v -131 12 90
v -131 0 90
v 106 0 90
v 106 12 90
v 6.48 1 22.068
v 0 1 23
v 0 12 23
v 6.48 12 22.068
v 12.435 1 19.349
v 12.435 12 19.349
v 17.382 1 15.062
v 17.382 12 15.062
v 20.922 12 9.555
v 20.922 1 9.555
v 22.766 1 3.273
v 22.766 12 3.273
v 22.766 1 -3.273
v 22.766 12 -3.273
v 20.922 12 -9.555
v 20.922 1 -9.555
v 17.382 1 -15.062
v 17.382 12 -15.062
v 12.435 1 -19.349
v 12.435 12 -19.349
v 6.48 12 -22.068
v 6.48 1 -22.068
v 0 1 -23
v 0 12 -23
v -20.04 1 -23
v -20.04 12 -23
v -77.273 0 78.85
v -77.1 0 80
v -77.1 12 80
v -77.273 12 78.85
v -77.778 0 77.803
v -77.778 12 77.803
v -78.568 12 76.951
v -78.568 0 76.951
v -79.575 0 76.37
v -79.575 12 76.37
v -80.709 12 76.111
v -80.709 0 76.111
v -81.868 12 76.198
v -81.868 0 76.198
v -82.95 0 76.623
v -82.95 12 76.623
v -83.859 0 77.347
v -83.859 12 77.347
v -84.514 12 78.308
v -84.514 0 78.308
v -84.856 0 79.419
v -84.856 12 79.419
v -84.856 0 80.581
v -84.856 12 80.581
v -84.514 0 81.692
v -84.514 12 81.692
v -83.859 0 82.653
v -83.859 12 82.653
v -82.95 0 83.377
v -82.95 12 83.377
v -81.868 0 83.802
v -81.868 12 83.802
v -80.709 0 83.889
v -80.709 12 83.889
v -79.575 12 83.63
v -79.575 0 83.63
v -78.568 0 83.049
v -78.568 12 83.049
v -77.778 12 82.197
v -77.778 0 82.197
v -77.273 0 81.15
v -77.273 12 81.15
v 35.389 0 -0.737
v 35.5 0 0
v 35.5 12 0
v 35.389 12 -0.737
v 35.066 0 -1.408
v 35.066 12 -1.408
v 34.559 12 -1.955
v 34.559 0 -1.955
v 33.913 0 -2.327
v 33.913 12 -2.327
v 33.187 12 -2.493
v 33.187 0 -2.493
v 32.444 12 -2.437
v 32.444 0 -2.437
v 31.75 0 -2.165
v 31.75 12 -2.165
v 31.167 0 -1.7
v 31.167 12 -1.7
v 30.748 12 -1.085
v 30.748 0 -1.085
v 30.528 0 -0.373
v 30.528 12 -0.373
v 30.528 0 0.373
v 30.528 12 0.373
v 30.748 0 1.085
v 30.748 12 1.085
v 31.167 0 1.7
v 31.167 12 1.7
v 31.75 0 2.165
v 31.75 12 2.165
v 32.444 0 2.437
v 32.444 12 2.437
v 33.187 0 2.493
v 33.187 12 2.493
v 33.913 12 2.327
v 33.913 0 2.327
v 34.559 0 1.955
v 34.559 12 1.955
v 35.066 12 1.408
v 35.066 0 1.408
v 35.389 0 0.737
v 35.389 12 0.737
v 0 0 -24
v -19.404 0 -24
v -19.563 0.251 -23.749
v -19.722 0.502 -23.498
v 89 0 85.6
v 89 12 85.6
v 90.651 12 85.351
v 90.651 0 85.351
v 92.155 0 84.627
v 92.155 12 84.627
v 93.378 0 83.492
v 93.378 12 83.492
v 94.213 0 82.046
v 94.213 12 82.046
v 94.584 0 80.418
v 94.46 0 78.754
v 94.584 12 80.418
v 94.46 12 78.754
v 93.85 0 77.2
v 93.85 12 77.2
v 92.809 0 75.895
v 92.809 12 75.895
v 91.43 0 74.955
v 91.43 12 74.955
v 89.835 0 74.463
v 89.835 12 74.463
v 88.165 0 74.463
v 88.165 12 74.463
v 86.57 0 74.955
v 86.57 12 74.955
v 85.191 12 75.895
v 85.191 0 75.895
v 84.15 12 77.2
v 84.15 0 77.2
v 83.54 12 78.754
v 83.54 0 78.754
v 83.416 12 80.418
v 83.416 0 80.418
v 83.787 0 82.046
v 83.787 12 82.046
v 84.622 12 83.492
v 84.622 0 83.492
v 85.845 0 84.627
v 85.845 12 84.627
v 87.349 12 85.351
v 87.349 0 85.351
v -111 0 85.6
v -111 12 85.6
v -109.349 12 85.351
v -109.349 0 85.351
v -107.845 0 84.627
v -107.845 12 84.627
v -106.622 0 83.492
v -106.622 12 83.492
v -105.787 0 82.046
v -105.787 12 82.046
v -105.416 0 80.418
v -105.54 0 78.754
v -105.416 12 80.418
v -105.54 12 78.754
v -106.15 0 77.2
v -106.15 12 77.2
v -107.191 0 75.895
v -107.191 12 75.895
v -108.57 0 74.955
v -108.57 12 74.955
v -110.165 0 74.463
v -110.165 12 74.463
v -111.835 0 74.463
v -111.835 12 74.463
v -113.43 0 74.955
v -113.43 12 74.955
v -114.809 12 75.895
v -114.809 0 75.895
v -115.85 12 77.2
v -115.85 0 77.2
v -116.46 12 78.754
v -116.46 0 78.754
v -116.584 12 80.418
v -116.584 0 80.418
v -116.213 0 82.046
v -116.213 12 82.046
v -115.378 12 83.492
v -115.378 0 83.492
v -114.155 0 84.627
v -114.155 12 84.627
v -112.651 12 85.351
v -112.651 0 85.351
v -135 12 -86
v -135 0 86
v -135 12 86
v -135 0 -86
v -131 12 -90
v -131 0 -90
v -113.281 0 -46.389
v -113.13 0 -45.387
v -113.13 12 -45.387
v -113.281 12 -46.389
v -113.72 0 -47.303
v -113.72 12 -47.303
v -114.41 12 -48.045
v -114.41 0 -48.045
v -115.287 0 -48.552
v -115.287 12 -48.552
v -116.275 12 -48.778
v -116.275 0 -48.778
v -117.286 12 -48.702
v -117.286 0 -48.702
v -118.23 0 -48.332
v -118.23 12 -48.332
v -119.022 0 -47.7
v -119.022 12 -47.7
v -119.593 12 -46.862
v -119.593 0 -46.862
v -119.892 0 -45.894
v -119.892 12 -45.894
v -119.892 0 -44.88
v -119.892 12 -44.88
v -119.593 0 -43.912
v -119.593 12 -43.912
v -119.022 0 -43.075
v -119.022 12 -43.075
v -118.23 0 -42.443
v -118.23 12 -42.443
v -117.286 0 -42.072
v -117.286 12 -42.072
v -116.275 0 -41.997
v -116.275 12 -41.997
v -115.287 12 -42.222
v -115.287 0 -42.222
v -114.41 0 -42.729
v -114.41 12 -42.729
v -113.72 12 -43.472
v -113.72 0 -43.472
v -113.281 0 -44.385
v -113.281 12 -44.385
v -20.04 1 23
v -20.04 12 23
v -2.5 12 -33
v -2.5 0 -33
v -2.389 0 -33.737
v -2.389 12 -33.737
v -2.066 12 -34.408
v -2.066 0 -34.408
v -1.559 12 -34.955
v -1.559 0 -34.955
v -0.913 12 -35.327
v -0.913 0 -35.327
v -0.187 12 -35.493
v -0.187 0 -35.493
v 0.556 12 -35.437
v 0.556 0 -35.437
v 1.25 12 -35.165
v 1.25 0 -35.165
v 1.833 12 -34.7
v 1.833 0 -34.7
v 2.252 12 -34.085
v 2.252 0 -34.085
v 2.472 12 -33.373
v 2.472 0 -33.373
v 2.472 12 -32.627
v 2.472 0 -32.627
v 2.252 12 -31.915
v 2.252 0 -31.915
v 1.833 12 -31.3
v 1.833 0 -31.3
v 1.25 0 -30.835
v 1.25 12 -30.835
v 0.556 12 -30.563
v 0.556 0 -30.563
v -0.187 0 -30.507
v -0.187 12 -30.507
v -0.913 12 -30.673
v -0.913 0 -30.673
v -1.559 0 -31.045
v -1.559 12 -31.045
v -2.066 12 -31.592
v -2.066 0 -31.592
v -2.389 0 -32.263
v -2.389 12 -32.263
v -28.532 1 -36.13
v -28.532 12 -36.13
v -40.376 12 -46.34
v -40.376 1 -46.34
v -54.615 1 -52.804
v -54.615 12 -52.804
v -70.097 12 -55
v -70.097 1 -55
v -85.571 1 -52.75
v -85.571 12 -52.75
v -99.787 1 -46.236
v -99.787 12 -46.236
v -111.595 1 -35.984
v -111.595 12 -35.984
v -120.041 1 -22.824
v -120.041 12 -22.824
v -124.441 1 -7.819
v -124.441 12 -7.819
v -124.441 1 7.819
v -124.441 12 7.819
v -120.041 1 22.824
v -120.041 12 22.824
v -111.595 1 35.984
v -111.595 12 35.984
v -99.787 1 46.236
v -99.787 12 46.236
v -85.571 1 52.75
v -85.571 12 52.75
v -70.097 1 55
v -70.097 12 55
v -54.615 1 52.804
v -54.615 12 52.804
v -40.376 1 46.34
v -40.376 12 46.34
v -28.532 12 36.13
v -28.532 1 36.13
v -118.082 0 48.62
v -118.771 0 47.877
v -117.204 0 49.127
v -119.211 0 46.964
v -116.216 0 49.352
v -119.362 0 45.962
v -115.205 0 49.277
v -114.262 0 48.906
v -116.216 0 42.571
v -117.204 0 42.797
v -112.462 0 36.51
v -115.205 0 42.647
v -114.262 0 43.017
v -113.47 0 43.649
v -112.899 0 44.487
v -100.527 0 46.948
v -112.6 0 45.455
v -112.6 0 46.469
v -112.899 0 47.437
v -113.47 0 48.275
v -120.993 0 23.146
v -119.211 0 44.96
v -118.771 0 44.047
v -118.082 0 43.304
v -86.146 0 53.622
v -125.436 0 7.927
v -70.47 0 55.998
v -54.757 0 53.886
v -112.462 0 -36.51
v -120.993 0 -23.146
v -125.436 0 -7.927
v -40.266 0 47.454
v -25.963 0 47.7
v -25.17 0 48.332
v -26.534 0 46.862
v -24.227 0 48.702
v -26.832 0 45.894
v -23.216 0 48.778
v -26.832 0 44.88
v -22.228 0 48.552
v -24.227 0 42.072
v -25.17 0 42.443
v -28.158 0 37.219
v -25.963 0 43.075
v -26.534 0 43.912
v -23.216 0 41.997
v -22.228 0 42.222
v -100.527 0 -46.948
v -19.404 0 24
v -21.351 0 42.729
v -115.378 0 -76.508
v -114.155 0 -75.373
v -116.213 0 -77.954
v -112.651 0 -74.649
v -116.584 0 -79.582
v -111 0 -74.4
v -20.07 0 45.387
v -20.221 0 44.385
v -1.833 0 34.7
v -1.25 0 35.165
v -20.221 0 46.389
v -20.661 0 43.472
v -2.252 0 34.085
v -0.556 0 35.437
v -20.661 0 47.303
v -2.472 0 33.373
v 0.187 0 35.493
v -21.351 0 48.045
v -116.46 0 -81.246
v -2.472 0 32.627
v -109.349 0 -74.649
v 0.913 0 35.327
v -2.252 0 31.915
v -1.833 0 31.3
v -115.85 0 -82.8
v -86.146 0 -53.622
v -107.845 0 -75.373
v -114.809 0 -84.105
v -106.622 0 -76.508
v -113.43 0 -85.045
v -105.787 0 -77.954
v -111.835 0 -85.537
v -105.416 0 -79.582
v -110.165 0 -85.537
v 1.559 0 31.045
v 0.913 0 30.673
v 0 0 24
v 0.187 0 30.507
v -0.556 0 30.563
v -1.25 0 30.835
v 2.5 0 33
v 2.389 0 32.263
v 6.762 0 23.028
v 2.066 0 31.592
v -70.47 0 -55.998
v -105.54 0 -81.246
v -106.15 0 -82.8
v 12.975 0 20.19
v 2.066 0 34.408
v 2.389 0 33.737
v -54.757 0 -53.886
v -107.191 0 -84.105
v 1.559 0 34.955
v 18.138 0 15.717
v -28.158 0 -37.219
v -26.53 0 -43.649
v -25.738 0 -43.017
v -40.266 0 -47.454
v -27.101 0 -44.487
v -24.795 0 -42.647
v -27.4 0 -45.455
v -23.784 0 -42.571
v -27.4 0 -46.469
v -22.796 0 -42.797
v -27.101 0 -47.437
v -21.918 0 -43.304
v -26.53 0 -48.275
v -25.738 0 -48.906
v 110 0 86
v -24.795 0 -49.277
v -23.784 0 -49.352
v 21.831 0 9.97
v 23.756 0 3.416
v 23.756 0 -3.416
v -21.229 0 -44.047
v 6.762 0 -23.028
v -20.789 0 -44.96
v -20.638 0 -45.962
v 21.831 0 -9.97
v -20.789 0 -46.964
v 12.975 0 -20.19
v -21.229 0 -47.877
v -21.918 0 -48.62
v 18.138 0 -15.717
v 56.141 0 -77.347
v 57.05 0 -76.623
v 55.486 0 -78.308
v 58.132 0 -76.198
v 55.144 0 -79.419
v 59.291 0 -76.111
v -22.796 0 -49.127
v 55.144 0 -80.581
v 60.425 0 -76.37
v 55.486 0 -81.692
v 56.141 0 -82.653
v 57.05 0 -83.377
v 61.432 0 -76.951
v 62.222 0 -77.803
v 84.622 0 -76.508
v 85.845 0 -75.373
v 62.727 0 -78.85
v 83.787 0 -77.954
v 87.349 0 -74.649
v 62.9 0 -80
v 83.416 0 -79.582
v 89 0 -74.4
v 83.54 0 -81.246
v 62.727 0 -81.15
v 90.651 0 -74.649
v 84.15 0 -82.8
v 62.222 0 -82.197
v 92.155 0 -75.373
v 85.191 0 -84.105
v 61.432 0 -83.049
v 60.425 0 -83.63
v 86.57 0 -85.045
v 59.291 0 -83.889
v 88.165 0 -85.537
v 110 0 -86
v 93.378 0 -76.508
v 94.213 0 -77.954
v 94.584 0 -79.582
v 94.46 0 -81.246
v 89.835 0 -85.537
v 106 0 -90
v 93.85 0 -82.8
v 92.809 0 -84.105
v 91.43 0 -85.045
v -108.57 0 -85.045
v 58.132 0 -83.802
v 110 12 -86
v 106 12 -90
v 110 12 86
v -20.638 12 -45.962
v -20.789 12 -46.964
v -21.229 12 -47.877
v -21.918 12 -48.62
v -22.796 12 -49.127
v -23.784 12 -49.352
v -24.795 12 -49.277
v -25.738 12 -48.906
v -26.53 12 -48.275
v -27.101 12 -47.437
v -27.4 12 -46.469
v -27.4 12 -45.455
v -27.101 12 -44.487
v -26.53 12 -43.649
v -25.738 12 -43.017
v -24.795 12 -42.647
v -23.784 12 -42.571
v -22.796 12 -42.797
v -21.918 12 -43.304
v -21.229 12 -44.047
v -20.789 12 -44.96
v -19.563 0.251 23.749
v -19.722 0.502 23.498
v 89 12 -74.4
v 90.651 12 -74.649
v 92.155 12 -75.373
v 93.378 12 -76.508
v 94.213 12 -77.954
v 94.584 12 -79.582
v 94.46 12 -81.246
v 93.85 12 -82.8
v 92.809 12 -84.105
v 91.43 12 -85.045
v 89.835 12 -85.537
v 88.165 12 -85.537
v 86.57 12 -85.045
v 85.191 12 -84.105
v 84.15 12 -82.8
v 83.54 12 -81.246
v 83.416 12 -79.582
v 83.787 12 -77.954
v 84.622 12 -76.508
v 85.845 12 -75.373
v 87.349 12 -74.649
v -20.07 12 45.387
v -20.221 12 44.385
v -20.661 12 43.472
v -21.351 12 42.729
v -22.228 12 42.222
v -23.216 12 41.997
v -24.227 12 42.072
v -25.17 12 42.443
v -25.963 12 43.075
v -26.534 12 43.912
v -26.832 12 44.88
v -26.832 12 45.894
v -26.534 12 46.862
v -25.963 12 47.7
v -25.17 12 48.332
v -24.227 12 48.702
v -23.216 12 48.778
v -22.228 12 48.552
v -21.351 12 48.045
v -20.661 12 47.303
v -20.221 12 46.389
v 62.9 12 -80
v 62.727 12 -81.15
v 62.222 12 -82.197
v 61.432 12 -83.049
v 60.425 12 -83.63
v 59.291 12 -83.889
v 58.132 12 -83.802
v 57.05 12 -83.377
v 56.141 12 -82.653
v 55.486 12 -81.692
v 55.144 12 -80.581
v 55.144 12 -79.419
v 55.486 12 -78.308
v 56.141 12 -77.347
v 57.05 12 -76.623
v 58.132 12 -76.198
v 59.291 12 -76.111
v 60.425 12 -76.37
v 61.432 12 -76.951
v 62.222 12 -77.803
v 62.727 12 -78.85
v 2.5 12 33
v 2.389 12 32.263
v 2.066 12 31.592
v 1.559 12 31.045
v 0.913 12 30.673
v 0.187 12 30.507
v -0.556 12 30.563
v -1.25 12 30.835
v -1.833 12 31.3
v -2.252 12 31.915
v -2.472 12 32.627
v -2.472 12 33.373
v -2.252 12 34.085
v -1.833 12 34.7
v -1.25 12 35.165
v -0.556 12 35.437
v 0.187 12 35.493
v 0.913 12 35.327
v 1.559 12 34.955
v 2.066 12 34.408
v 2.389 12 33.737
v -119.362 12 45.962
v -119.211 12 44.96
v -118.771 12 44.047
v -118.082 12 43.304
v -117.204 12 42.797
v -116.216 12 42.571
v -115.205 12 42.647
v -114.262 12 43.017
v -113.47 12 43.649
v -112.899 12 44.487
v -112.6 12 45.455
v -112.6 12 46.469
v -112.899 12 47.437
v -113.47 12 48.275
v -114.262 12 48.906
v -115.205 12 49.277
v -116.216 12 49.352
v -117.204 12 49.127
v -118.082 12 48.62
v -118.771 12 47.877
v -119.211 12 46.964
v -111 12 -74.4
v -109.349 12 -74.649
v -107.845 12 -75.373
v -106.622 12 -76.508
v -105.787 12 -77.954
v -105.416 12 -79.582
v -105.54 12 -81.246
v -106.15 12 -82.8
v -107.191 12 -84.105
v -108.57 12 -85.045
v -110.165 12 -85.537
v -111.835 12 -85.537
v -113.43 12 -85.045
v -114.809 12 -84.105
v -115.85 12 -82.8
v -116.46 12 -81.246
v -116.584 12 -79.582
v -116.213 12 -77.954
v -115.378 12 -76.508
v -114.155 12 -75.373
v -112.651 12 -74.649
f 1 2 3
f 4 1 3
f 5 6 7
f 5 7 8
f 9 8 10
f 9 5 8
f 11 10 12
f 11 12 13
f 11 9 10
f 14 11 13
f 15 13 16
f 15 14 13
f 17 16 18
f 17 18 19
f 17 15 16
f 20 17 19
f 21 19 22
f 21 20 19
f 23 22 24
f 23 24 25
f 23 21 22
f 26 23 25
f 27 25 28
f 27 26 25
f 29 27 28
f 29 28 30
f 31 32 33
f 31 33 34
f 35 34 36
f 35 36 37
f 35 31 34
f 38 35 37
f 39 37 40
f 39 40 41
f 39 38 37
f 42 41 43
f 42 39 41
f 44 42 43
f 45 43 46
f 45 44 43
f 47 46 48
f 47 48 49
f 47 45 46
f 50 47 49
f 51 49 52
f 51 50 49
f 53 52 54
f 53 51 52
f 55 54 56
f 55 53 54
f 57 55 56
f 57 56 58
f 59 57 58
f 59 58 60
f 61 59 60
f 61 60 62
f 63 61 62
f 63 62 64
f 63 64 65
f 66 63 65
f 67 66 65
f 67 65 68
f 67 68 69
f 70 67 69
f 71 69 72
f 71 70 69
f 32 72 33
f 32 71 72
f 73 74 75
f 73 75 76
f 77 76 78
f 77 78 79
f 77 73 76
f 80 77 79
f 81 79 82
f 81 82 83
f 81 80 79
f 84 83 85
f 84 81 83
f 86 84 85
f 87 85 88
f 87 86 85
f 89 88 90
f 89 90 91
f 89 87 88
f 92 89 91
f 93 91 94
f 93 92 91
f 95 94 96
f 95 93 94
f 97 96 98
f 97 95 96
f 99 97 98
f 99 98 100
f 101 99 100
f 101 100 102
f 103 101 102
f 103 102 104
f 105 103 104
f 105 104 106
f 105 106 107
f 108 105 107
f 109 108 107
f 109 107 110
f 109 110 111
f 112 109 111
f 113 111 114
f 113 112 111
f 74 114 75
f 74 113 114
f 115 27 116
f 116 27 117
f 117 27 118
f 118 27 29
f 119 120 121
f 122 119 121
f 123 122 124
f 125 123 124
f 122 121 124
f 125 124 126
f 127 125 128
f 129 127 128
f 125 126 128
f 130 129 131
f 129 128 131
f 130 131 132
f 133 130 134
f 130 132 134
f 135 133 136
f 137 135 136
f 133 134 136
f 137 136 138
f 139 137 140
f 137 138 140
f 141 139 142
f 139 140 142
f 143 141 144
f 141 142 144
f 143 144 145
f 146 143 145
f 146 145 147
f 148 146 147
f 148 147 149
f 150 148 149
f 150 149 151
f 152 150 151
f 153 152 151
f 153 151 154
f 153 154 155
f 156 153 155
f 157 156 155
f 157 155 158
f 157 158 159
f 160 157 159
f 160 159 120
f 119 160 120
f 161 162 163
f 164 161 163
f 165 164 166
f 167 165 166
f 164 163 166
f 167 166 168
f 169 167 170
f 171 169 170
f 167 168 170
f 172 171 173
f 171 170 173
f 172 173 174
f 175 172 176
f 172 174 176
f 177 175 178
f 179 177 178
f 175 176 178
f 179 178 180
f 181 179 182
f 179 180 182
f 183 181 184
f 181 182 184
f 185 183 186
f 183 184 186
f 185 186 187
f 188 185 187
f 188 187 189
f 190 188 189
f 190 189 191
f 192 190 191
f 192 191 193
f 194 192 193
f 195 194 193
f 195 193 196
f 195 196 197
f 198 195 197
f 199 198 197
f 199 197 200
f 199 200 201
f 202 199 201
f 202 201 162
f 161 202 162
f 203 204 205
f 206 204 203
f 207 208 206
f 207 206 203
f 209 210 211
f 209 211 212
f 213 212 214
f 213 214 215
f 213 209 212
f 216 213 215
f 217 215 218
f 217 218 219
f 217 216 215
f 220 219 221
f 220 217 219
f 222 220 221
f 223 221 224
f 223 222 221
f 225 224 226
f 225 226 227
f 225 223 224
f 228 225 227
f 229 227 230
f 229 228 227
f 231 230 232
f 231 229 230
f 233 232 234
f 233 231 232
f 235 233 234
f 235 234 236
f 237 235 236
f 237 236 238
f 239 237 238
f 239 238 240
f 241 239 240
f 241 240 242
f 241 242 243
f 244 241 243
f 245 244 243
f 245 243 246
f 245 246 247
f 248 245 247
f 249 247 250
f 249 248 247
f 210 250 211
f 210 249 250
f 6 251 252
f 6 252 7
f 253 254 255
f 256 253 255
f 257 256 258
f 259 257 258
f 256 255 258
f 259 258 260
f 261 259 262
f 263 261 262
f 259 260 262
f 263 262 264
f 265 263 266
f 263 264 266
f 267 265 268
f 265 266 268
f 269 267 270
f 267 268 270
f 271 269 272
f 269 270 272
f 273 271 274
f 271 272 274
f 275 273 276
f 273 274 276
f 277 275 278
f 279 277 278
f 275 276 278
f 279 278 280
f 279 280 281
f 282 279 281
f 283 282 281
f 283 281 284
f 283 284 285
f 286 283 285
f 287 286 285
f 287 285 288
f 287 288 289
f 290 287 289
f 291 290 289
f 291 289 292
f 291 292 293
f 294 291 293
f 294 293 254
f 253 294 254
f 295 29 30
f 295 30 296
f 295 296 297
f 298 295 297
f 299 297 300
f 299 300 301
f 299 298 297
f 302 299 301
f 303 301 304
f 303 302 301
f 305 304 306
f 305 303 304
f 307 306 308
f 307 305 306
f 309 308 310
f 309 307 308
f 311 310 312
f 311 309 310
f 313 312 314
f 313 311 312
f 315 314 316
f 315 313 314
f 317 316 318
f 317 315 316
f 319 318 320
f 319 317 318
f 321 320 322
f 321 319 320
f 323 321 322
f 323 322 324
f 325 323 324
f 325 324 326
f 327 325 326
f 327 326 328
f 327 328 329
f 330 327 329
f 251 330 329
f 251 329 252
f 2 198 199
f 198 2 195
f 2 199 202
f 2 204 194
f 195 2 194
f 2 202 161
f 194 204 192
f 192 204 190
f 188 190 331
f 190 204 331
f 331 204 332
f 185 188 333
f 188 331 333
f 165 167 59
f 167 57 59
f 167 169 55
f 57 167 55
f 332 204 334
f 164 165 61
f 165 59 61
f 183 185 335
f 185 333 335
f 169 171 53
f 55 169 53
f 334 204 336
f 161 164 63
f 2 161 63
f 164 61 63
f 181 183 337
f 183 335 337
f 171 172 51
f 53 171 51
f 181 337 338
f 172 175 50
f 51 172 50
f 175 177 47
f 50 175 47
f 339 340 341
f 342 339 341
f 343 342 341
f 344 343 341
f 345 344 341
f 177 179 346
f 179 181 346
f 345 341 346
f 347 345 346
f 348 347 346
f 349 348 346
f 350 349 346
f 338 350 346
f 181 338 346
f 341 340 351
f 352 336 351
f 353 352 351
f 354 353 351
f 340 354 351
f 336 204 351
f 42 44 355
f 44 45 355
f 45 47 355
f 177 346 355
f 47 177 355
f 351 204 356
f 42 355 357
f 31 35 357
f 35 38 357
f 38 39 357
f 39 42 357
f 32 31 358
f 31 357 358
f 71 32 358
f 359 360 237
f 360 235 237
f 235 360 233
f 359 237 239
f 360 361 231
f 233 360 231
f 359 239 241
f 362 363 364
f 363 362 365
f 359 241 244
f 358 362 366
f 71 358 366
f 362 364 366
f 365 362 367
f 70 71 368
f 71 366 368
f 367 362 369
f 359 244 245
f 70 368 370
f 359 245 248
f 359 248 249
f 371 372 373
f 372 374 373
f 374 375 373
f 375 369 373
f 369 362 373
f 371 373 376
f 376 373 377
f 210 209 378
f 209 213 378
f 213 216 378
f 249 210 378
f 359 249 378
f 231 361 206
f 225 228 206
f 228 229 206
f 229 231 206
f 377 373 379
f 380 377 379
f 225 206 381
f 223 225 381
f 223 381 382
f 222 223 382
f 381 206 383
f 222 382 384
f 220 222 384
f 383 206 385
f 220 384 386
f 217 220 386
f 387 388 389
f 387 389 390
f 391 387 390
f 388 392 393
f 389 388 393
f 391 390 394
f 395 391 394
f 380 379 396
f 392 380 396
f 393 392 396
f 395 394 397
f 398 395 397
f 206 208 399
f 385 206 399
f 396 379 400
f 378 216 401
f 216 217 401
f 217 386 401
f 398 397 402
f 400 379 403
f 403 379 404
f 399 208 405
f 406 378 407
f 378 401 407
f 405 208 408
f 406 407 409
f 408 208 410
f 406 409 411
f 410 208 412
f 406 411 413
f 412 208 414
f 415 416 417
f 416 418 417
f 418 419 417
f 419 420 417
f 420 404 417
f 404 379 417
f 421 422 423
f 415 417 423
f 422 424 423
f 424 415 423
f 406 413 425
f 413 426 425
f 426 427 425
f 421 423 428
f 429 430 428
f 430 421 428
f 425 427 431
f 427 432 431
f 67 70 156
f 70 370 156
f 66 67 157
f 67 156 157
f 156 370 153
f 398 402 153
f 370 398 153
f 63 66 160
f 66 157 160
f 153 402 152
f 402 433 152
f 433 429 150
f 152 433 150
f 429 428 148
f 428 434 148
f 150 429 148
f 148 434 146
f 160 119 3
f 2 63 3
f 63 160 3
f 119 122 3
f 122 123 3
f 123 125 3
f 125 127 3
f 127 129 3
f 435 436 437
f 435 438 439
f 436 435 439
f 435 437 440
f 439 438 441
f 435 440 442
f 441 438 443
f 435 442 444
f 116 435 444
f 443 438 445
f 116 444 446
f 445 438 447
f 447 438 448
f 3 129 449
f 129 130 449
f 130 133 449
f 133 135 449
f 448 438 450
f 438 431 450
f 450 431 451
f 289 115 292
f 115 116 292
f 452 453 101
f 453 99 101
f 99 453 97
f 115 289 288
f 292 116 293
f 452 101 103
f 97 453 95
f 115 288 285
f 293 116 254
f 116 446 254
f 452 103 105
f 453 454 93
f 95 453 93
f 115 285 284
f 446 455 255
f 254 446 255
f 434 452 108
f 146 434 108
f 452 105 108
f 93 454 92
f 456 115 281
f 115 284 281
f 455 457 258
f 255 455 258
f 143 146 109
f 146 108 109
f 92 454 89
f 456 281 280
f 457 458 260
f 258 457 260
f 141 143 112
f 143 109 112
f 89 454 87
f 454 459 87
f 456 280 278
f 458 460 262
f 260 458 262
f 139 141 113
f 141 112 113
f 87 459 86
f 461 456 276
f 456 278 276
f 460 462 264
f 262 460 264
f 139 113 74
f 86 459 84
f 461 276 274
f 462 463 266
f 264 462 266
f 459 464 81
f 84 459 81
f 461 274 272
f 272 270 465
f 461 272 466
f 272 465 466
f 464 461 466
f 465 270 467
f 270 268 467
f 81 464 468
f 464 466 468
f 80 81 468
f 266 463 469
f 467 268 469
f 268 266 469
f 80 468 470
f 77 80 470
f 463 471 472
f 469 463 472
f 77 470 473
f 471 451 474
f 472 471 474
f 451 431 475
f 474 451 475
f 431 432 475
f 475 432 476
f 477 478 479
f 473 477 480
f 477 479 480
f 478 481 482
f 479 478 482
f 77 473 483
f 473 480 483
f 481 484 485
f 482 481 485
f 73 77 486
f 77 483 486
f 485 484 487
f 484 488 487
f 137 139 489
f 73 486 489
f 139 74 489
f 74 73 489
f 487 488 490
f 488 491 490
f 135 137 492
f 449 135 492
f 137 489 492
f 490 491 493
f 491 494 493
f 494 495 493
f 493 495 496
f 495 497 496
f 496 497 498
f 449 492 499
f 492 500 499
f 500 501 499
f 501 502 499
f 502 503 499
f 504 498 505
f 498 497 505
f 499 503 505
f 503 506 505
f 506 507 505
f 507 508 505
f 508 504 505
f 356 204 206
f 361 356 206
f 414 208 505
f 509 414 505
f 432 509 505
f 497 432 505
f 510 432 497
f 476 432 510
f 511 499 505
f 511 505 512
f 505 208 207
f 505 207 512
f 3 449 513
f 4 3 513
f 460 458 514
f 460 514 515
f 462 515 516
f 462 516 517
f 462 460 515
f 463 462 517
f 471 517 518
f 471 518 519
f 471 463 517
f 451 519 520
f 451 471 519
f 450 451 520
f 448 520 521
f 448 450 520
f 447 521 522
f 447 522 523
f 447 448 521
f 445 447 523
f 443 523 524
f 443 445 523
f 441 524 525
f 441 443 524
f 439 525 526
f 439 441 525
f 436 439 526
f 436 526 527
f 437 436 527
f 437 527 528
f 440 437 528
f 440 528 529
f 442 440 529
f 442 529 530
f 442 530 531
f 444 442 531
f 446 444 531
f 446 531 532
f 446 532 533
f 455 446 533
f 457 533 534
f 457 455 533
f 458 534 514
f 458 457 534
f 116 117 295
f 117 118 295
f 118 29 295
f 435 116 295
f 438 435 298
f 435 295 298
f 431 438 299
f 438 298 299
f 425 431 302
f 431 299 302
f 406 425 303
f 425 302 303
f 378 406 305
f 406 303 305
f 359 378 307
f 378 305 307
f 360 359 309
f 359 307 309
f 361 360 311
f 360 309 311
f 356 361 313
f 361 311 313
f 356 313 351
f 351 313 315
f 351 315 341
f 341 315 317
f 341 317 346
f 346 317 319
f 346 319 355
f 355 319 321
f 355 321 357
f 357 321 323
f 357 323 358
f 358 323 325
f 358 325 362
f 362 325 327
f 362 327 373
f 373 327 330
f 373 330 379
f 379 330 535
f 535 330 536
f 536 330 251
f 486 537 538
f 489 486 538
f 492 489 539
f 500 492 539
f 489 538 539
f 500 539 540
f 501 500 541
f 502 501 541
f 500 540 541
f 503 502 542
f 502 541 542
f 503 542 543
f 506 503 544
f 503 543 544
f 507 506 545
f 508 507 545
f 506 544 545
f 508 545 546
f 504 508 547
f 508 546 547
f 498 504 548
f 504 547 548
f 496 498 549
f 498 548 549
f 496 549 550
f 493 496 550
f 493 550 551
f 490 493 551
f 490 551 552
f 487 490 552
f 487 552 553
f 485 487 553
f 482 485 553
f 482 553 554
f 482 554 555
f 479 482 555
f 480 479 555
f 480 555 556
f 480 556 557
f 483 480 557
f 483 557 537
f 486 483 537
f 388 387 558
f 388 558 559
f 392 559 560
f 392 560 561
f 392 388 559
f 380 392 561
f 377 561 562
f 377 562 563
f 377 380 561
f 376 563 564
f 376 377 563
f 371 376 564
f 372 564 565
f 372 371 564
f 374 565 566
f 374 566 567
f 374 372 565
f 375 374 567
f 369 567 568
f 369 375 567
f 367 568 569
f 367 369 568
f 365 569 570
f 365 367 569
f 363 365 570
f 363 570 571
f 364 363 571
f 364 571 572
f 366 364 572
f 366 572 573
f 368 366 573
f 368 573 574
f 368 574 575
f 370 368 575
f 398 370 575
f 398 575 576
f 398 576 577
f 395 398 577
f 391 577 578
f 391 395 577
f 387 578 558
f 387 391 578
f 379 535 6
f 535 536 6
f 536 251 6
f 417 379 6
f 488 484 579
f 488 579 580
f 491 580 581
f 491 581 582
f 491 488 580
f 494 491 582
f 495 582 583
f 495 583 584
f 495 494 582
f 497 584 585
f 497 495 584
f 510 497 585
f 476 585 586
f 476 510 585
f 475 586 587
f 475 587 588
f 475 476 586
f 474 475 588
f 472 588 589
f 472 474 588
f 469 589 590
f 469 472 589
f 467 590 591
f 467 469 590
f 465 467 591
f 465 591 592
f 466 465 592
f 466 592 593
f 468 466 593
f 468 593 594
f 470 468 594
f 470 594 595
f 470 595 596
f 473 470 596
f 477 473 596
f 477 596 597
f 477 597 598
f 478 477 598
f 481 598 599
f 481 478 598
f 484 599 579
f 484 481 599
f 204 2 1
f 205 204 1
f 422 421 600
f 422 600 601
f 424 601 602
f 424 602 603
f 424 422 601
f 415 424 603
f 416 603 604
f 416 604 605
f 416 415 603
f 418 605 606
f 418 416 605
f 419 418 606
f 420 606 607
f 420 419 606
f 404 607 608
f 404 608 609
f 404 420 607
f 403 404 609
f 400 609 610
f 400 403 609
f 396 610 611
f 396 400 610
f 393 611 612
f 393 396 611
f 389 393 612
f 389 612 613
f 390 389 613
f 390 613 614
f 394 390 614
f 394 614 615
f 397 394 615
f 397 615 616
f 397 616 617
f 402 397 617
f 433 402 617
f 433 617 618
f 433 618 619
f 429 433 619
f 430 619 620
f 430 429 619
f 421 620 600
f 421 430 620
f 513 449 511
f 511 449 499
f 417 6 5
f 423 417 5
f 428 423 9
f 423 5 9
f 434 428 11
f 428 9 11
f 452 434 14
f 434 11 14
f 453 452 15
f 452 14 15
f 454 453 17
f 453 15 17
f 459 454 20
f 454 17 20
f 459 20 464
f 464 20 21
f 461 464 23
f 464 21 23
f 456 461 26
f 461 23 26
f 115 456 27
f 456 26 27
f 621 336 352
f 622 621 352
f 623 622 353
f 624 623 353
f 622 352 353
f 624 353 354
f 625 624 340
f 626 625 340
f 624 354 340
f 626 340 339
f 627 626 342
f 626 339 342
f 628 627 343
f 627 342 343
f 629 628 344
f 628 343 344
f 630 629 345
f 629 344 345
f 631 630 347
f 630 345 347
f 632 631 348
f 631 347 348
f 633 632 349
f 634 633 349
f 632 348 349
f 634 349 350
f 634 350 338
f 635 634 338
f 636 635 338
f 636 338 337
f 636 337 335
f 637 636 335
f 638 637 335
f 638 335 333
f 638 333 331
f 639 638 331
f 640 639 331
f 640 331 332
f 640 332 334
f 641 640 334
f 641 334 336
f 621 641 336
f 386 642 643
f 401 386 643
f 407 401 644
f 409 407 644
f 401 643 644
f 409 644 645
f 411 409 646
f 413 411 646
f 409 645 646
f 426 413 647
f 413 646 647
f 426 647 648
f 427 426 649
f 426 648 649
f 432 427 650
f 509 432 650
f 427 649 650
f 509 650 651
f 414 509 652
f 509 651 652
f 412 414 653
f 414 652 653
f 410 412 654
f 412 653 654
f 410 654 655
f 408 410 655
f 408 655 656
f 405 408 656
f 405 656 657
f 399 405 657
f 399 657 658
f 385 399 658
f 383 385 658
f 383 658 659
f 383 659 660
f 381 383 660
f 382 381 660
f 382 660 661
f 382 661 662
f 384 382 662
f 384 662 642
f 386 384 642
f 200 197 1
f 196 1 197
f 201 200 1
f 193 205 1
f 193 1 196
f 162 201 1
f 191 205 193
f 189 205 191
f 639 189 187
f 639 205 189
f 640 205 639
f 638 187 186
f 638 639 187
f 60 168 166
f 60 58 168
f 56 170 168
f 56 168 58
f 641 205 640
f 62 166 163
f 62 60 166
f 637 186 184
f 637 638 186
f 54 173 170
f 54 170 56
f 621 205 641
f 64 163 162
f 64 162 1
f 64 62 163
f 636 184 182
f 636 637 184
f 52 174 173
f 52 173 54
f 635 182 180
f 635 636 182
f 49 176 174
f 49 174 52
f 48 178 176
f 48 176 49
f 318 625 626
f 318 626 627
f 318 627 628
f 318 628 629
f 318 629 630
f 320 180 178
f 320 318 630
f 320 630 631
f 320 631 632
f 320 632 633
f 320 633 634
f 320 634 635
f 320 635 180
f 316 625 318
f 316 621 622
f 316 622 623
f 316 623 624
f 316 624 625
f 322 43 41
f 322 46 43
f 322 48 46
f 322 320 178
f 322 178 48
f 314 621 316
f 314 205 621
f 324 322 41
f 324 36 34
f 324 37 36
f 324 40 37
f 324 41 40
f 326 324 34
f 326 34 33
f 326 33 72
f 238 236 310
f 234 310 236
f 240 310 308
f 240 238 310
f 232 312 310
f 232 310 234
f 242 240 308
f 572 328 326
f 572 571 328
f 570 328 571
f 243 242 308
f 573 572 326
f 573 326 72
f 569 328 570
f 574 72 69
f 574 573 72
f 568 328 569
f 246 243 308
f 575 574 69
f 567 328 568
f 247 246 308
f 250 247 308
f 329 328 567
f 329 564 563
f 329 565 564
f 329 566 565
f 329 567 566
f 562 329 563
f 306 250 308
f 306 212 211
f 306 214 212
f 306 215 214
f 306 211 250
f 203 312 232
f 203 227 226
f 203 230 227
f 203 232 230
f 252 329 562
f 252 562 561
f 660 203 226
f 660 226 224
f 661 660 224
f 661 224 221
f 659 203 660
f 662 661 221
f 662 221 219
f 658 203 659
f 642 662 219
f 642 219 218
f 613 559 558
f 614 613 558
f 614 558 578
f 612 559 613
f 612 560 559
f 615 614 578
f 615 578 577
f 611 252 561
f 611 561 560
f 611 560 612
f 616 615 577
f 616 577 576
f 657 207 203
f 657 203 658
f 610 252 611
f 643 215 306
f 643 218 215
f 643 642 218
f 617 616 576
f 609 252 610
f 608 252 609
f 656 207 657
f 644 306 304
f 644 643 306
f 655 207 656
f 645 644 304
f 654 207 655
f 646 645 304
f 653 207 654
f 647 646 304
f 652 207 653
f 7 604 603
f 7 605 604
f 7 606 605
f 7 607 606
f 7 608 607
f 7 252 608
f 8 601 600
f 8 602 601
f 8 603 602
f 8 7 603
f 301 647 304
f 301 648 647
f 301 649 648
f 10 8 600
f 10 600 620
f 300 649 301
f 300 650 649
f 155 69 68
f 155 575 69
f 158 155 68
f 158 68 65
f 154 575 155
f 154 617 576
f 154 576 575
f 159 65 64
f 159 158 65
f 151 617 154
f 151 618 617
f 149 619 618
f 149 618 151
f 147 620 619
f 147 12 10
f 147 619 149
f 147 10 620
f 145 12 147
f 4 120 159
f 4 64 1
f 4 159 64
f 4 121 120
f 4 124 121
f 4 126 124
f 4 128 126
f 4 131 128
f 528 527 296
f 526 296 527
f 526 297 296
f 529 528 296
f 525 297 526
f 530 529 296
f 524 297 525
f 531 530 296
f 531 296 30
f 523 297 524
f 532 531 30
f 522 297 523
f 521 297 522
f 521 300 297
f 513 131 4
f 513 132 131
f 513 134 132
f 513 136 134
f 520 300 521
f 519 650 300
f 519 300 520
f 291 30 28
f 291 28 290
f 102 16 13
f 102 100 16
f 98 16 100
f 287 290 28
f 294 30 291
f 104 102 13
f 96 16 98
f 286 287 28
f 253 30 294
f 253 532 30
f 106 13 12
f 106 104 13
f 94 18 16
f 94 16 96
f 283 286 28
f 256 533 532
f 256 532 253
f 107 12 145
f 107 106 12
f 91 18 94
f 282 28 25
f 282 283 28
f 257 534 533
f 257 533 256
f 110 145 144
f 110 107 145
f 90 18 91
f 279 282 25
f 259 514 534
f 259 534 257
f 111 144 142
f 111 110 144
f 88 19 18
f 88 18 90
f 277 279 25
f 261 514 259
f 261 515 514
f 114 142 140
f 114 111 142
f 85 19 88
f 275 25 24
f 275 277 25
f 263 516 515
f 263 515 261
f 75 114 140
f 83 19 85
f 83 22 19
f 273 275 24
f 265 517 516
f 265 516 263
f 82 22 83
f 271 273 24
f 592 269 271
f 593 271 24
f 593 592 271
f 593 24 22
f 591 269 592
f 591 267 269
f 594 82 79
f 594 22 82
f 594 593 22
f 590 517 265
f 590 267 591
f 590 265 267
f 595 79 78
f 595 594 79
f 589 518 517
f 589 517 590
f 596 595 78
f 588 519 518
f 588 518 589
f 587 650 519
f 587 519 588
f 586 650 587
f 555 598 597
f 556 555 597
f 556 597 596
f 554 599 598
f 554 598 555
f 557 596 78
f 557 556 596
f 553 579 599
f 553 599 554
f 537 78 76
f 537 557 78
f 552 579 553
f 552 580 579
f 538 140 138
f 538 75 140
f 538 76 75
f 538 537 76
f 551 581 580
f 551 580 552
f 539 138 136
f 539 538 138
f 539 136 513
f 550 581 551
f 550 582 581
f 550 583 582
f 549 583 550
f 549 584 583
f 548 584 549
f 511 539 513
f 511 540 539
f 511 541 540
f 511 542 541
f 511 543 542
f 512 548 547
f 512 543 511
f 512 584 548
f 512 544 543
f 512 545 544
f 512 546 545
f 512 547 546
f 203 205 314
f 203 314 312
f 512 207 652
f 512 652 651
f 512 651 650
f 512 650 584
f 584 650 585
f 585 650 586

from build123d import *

# Parameters (mm, degrees)
SKETCH1_W                 = 245
SKETCH1_H                 = 180
BOSS_EXTRUDE1_DEPTH       = 12
CHAMFER2_SIZE             = 4
M8_TAPPED_HOLE1_D         = 6.8
M6_TAPPED_HOLE1_D         = 5
CHAMFER3_SIZE             = 1
SKETCH_PATTERN1_OUTLINE_R = 2.5
SKETCH_PATTERN1_DEPTH     = 12
SKETCH_PATTERN2_OUTLINE_R = 3.4
SKETCH_PATTERN2_DEPTH     = 12
CUT_EXTRUDE1_REACH        = 164.693
SKETCH11_R                = 5.6
SKETCH_PATTERN4_OUTLINE_R = 3.9
SKETCH_PATTERN4_DEPTH     = 12


# Read off the part's stored shape, not the designer's step: Sketch-Pattern1, Sketch-Pattern2, Sketch-Pattern4
with BuildPart() as part:
    # Sketch1 → Boss-Extrude1 (new body)
    with BuildSketch(Plane(origin=(0, 0, 0), x_dir=(1, 0, 0), z_dir=(0, 1, 0))):
        with Locations((-12.5, 0)):
            Rectangle(SKETCH1_W, SKETCH1_H)
        with BuildLine():
            Line((0, 23), (-20.040016013, 23))
            ThreePointArc((-20.040016013, 23), (-125, 0), (-20.040016013, -23))
            Line((-20.040016013, -23), (0, -23))
            ThreePointArc((0, -23), (23, 0), (0, 23))
        make_face(mode=Mode.SUBTRACT)
    extrude(amount=BOSS_EXTRUDE1_DEPTH)

    # Chamfer2
    chamfer2_edges = [part.edges().sort_by_distance(p)[0] for p in [
        (-135, 6, -90),
        (110, 6, -90),
        (110, 6, 90),
        (-135, 6, 90),
    ]]
    chamfer(chamfer2_edges, length=CHAMFER2_SIZE)

    # M8 Tapped Hole1 (through all)
    with Locations(Plane(origin=(0, 12, 0), x_dir=(1, 0, 0), z_dir=(0, 1, 0))):
        with Locations((-115.961940777, -45.961940777)):
            Hole(M8_TAPPED_HOLE1_D / 2)

    # M6 Tapped Hole1 (through all)
    with Locations(Plane(origin=(0, 12, 0), x_dir=(1, 0, 0), z_dir=(0, 1, 0))):
        with Locations((0, 33)):
            Hole(M6_TAPPED_HOLE1_D / 2)

    # Chamfer3
    chamfer3_edges = [part.edges().sort_by_distance(p)[0] for p in [
        (23, 0, 0),
        (-10.020008006, 0, -23),
        (-125, 0, 0),
        (-10.020008006, 0, 23),
    ]]
    chamfer(chamfer3_edges, length=CHAMFER3_SIZE)

    # Sketch-Pattern1 outline → Sketch-Pattern1 (cut)
    with BuildSketch(Plane(origin=(0, 0, 0), x_dir=(1, 0, 0), z_dir=(0, 1, 0))):
        with Locations((0, -33)):
            Circle(SKETCH_PATTERN1_OUTLINE_R)
        with Locations((33, 0)):
            Circle(SKETCH_PATTERN1_OUTLINE_R)
    extrude(amount=SKETCH_PATTERN1_DEPTH, mode=Mode.SUBTRACT)

    # Sketch-Pattern2 outline → Sketch-Pattern2 (cut)
    with BuildSketch(Plane(origin=(0, 0, 0), x_dir=(1, 0, 0), z_dir=(0, 1, 0))):
        with Locations((-116.529552601, 45.387230966)):
            Circle(SKETCH_PATTERN2_OUTLINE_R)
        with Locations((-24.038059223, 45.961940777)):
            Circle(SKETCH_PATTERN2_OUTLINE_R)
        with Locations((-23.470447399, -45.387230966)):
            Circle(SKETCH_PATTERN2_OUTLINE_R)
    extrude(amount=SKETCH_PATTERN2_DEPTH, mode=Mode.SUBTRACT)

    # Sketch11 → Cut-Extrude1 (cut, up to next)
    with BuildSketch(Plane(origin=(0, 12, 0), x_dir=(1, 0, 0), z_dir=(0, 1, 0)), mode=Mode.PRIVATE) as cut_extrude1_sk1:
        with Locations(Location((-111, -80, 0), (0, 0, 270))):
            Circle(SKETCH11_R)
    cut_extrude1_tool1 = extrude(cut_extrude1_sk1.sketch, amount=-CUT_EXTRUDE1_REACH, mode=Mode.PRIVATE) & part.part
    cut_extrude1 = cut_extrude1_tool1.solids().sort_by_distance((-111, 12, 80))[0]
    add(cut_extrude1, mode=Mode.SUBTRACT)

    # Sketch-Pattern3: Cut-Extrude1 at 3 more places
    with Locations((200, 0, 0), (200, 0, -160), (0, 0, -160)):
        add(cut_extrude1, mode=Mode.SUBTRACT)

    # Sketch-Pattern4 outline → Sketch-Pattern4 (cut)
    with BuildSketch(Plane(origin=(0, 0, 0), x_dir=(1, 0, 0), z_dir=(0, 1, 0))):
        with Locations((-81, -80)):
            Circle(SKETCH_PATTERN4_OUTLINE_R)
        with Locations((59, 80)):
            Circle(SKETCH_PATTERN4_OUTLINE_R)
    extrude(amount=SKETCH_PATTERN4_DEPTH, mode=Mode.SUBTRACT)


solid = part.part
